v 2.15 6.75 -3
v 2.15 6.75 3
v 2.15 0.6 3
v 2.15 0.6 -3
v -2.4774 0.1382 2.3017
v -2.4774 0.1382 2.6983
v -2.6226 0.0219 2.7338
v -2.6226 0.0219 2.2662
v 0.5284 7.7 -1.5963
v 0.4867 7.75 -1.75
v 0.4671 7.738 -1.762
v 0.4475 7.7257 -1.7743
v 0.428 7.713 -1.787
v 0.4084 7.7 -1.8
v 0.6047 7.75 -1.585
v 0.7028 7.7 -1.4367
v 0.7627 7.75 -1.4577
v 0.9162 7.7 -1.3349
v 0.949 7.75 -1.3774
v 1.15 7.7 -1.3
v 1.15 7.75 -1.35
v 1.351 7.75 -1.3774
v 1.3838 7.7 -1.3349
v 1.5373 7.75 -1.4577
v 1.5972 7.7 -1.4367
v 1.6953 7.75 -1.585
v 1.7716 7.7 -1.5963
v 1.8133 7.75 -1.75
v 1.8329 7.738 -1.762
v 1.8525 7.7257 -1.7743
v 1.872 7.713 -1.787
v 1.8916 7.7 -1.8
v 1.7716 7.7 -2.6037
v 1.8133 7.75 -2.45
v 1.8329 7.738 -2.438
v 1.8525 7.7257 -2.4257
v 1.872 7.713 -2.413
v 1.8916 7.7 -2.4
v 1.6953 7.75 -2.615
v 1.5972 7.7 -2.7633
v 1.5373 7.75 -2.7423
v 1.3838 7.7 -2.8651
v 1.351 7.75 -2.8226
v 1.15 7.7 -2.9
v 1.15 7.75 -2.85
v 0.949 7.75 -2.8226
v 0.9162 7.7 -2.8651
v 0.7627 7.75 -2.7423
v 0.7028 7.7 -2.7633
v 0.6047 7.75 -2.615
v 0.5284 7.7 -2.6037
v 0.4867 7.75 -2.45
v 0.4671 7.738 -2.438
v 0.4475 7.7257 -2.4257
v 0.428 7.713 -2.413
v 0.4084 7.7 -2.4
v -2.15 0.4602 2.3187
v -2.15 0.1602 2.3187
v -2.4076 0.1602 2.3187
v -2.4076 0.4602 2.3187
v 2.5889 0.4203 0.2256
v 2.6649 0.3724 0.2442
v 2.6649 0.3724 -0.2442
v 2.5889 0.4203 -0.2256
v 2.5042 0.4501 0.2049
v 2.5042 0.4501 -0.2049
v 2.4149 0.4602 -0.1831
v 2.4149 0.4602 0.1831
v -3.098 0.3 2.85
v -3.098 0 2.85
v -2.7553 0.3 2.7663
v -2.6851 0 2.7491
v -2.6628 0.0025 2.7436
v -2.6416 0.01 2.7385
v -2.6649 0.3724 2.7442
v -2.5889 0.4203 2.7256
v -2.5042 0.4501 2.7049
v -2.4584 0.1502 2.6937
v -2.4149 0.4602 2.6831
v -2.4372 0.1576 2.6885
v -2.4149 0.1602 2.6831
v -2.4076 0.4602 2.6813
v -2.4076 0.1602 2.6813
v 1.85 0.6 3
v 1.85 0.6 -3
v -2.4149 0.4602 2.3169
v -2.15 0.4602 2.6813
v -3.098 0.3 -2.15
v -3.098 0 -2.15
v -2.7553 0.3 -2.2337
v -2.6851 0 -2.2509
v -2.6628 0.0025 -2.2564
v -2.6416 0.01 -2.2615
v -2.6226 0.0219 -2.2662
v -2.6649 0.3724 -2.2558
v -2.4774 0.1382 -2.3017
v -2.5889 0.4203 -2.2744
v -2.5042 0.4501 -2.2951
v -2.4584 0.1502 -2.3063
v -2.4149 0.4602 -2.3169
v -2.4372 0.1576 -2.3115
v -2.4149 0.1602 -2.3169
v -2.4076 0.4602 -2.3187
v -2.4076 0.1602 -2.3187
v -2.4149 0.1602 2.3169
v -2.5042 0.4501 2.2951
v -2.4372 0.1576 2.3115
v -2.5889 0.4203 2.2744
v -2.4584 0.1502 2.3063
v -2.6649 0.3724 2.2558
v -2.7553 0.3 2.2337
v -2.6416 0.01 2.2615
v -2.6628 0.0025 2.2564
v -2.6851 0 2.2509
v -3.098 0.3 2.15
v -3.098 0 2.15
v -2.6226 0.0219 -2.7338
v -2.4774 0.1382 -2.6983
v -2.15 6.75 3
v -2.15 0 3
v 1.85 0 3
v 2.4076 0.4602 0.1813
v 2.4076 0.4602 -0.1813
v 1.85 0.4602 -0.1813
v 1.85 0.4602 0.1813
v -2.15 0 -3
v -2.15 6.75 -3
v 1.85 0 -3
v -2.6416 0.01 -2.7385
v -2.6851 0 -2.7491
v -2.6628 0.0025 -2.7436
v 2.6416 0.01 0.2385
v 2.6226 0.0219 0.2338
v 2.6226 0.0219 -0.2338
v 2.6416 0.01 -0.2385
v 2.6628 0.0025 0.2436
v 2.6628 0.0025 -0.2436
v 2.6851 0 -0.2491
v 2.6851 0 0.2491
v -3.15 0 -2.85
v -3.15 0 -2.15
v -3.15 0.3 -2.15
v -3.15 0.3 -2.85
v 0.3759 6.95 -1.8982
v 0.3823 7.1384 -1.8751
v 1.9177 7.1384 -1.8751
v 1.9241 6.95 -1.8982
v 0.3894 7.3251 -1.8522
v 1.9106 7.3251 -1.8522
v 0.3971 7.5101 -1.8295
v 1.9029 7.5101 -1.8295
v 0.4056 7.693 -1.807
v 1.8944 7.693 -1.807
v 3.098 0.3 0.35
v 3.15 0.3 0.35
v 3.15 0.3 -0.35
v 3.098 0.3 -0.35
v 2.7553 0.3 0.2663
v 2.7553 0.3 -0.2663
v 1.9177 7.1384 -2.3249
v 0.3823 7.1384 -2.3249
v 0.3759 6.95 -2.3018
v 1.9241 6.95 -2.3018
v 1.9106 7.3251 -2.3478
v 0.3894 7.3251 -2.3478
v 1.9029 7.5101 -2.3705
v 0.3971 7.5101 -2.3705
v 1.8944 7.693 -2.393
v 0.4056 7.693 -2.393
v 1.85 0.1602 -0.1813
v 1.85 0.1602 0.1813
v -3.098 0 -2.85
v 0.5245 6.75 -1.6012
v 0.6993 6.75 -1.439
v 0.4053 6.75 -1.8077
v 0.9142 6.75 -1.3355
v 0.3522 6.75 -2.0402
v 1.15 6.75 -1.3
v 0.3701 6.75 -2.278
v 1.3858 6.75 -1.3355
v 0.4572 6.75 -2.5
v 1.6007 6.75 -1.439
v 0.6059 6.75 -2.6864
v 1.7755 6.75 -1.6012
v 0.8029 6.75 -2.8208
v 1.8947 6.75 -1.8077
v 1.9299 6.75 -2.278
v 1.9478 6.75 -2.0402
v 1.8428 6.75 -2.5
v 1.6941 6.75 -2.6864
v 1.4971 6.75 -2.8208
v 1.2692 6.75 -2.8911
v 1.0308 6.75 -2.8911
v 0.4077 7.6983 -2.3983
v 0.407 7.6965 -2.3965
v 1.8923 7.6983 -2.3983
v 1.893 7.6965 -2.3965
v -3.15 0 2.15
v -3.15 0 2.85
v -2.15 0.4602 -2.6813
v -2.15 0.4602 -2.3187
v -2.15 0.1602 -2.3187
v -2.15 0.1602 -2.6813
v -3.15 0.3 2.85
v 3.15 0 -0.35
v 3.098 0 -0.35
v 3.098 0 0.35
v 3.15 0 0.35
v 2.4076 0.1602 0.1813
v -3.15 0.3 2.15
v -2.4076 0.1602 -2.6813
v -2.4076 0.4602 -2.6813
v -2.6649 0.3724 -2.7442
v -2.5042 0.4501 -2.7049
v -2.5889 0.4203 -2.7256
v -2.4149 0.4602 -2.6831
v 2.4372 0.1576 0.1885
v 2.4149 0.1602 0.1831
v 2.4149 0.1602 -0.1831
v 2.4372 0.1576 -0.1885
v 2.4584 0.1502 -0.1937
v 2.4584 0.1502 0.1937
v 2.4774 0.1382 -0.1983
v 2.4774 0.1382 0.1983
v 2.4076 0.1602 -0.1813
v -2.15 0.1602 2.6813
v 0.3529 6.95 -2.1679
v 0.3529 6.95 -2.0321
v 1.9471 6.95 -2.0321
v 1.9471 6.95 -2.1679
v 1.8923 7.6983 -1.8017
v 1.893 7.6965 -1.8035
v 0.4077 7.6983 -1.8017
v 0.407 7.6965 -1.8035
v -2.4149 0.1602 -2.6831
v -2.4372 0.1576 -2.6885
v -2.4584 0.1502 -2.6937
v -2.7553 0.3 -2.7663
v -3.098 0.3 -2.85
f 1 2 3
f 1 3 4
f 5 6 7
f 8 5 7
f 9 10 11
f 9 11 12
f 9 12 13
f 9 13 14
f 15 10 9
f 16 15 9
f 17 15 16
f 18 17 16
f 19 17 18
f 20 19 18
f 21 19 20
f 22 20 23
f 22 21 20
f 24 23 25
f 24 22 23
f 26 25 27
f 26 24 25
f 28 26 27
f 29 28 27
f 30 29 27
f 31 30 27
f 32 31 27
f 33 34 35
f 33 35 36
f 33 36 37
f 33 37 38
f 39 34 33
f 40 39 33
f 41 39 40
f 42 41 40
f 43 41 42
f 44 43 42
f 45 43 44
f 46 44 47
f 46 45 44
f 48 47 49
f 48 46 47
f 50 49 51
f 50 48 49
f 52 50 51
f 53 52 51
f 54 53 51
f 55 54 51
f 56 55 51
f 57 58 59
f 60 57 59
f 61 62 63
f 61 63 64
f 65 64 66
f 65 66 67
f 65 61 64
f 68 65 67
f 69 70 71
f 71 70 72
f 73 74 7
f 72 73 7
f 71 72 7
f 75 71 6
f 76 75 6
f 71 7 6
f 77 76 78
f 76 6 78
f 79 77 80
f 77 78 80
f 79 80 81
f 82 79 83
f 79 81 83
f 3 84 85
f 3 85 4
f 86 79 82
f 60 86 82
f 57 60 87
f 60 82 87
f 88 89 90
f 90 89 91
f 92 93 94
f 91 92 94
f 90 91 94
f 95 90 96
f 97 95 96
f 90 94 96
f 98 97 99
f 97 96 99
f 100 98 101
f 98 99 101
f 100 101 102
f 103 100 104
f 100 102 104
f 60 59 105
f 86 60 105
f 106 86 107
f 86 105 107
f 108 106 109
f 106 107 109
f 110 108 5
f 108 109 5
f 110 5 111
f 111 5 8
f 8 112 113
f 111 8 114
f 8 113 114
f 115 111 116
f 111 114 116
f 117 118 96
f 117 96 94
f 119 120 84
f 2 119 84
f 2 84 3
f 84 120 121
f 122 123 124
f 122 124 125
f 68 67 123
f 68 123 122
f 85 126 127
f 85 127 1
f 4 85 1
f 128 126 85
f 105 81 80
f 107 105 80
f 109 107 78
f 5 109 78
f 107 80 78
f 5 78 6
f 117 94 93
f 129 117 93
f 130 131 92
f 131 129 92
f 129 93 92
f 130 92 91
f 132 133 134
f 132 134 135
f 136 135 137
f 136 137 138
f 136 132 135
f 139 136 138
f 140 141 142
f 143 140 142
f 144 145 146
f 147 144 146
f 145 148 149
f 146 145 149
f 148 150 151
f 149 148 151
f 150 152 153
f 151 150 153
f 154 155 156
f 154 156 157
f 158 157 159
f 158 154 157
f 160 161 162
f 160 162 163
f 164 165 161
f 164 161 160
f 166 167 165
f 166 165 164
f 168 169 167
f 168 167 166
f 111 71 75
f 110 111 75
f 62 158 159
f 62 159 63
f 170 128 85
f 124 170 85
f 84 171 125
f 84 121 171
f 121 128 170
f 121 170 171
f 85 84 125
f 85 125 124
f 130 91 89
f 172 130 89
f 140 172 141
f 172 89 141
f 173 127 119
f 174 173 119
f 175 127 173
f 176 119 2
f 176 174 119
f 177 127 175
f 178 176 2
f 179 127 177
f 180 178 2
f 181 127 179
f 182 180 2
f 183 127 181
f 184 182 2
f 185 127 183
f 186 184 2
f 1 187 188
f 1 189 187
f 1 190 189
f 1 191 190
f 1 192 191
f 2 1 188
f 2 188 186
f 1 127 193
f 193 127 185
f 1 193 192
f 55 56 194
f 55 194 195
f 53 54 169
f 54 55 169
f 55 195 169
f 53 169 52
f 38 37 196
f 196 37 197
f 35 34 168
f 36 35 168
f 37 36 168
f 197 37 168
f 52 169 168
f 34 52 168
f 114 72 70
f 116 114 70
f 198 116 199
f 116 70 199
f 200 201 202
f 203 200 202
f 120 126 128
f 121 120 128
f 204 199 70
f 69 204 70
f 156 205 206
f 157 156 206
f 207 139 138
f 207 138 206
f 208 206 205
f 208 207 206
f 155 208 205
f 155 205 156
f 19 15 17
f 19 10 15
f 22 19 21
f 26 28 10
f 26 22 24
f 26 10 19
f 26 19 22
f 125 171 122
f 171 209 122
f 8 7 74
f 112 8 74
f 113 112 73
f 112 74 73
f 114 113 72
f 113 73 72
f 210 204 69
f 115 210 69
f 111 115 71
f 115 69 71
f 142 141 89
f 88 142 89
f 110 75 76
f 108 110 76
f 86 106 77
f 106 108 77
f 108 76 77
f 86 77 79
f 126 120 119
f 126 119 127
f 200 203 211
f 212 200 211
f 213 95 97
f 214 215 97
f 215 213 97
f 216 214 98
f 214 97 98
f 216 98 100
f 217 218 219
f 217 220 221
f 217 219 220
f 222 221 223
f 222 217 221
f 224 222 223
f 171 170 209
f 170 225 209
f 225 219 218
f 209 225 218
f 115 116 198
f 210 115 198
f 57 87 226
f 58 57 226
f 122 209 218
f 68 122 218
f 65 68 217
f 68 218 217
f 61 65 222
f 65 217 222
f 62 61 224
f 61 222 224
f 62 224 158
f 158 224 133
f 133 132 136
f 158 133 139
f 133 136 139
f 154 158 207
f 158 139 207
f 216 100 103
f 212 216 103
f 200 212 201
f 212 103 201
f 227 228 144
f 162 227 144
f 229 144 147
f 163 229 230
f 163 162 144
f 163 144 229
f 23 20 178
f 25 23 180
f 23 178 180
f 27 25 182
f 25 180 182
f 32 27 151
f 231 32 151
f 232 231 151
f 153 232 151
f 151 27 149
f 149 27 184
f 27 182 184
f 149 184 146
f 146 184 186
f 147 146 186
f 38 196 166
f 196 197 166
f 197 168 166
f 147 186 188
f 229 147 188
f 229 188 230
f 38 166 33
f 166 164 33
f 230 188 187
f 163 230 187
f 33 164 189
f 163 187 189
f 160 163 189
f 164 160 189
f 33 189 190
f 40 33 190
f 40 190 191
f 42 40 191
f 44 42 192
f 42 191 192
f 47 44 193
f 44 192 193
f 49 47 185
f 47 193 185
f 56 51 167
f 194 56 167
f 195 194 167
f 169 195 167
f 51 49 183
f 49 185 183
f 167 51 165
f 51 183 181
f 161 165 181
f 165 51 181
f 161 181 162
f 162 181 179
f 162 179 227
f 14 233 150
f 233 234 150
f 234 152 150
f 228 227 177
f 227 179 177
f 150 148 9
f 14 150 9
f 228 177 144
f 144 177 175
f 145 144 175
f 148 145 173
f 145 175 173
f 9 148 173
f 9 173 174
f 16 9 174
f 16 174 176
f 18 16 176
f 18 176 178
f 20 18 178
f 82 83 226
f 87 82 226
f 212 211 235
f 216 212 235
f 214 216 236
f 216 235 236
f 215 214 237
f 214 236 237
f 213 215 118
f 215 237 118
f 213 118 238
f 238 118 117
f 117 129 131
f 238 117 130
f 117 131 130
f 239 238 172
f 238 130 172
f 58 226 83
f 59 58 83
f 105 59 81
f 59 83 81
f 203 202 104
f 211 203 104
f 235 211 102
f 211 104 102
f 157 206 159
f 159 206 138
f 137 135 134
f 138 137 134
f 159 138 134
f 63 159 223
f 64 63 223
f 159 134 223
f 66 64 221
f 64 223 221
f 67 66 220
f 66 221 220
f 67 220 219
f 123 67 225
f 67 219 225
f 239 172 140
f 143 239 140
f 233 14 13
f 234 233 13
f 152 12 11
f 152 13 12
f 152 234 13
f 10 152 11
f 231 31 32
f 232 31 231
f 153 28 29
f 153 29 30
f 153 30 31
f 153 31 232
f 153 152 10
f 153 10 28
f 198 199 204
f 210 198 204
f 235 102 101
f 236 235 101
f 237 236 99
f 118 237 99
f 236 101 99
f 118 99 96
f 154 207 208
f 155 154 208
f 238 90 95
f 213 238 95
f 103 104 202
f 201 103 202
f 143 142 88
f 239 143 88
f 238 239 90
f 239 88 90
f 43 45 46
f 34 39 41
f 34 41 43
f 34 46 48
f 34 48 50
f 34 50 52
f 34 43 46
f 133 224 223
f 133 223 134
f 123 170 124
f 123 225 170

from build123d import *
from OCP.BRepFilletAPI import BRepFilletAPI_MakeChamfer

# Parameters (mm, degrees)
SKETCH1_W           = 4.3
SKETCH1_H           = 6
BOSS_EXTRUDE1_DEPTH = 6.75
SKETCH2_R           = 0.8
BOSS_EXTRUDE2_DEPTH = 1
SKETCH3_W           = 1.811917262
SKETCH3_H           = 0.6
CUT_EXTRUDE2_DEPTH  = 0.8
CUT_EXTRUDE2_DRAFT  = -7
CHAMFER1_SIZE       = 0.05
CHAMFER1_SIZE2      = 0.05742659
BOSS_EXTRUDE3_DEPTH = 6
CUT_EXTRUDE5_DEPTH  = 0.8
SKETCH9_W           = 0.3
SKETCH9_H           = 0.6
CUT_EXTRUDE7_DEPTH  = 11.294901651
SKETCH10_W          = 0.362580834
SKETCH10_H          = 0.3
BOSS_EXTRUDE4_DEPTH = 0.3


with BuildPart() as part:
    # Sketch1 → Boss-Extrude1 (new body)
    with BuildSketch(Plane(origin=(0, 0, 0), x_dir=(1, 0, 0), z_dir=(0, 1, 0))):
        Rectangle(SKETCH1_W, SKETCH1_H)
    extrude(amount=BOSS_EXTRUDE1_DEPTH)

    # Sketch2 → Boss-Extrude2 (add)
    with BuildSketch(Plane(origin=(0, 6.75, 0), x_dir=(1, 0, 0), z_dir=(0, 1, 0))):
        with Locations(Location((1.15, 2.1, 0), (0, 0, 270))):
            Circle(SKETCH2_R)
    extrude(amount=BOSS_EXTRUDE2_DEPTH)


with BuildPart() as cut_extrude2_tool:
    # Sketch3 → Cut-Extrude2 (with draft: the straight prism first)
    with BuildSketch(Plane(origin=(0, 7.75, 0), x_dir=(1, 0, 0), z_dir=(0, 1, 0))):
        with Locations((1.15, 2.1)):
            Rectangle(SKETCH3_W, SKETCH3_H)
    extrude(amount=-CUT_EXTRUDE2_DEPTH)
    # Cut-Extrude2: the draft: its side faces are tilted about the plane it starts from
    cut_extrude2_sides = [cut_extrude2_tool.faces().sort_by_distance(p)[0] for p in [
        (1.15, 7.35, -2.4),
        (0.244041369, 7.35, -2.1),
        (1.15, 7.35, -1.8),
        (2.055958631, 7.35, -2.1),
    ]]
    draft(cut_extrude2_sides, Plane(origin=(0, 7.75, 0), x_dir=(1, 0, 0), z_dir=(0, 1, 0)), CUT_EXTRUDE2_DRAFT)


with BuildPart() as part_1:
    add(part.part)

    # Cut-Extrude2: cut by cut_extrude2_tool
    add(cut_extrude2_tool.part, mode=Mode.SUBTRACT)

    # Chamfer1: one chamfer whose edges measure the first distance from different faces: ONE call of the kernel's chamfer builder (chamfer() names one face for all edges)
    chamfer1_edges_1 = [part_1.edges().sort_by_distance(p)[0] for p in [
        (1.15, 7.75, -2.4),
    ]]
    chamfer1_side_1 = [part_1.faces().sort_by_distance(p)[0] for p in [
        (1.15, 7.75, -2.606561726),
    ]]
    chamfer1_edges_2 = [part_1.edges().sort_by_distance(p)[0] for p in [
        (1.15, 7.75, -1.8),
    ]]
    chamfer1_side_2 = [part_1.faces().sort_by_distance(p)[0] for p in [
        (1.15, 7.75, -1.593438274),
    ]]
    chamfer1_edges_3 = [part_1.edges().sort_by_distance(p)[0] for p in [
        (1.597213595, 7.75, -1.436675042),
        (1.15, 7.75, -2.9),
    ]]
    chamfer1 = BRepFilletAPI_MakeChamfer(part_1.part.solid().wrapped)
    for e in chamfer1_edges_1:
        chamfer1.Add(CHAMFER1_SIZE, CHAMFER1_SIZE2, e.wrapped, chamfer1_side_1[0].wrapped)  # the first distance lies on this face
    for e in chamfer1_edges_2:
        chamfer1.Add(CHAMFER1_SIZE, CHAMFER1_SIZE2, e.wrapped, chamfer1_side_2[0].wrapped)  # the first distance lies on this face
    for e in chamfer1_edges_3:
        chamfer1.Add(CHAMFER1_SIZE, e.wrapped)
    add(Compound.cast(chamfer1.Shape()), mode=Mode.REPLACE)


with BuildPart() as body_2:
    # Sketch6 → Boss-Extrude3 (new, through all)
    with BuildSketch(Plane.XY.offset(3)):
        with BuildLine():
            Line((-2.15, 0.160165276), (-2.414893608, 0.160165276))
            ThreePointArc((-2.414893608, 0.160165276), (-2.448018066, 0.154519768), (-2.477402436, 0.138220682))
            Line((-2.477402436, 0.138220682), (-2.622597564, 0.021944594))
            ThreePointArc((-2.622597564, 0.021944594), (-2.651981934, 0.005645507), (-2.685106392, 0))
            Line((-2.685106392, 0), (-3.15, 0))
            Line((-3.15, 0), (-3.15, 0.3))
            Line((-3.15, 0.3), (-2.755319175, 0.3))
            Line((-2.755319175, 0.3), (-2.664928921, 0.3723869))
            ThreePointArc((-2.664928921, 0.3723869), (-2.547391439, 0.437583247), (-2.414893608, 0.460165276))
            Line((-2.414893608, 0.460165276), (-2.15, 0.460165276))
            Line((-2.15, 0.460165276), (-2.15, 0.160165276))
        make_face()
    boss_extrude3 = extrude(amount=-BOSS_EXTRUDE3_DEPTH)


with BuildPart() as part_2:
    add(part_1.part)

    # Mirror8: Boss-Extrude3 across plane
    add(boss_extrude3.mirror(Plane(origin=(0, 0, 0), x_dir=(0, 0, 1), z_dir=(1, 0, 0))))


with BuildPart() as cut_extrude5_tool:
    # Sketch7 → Cut-Extrude5 (new body)
    with BuildSketch(Plane.XZ):
        Polygon((-2.15, -2.318709583), (-2.15, 2.318709583), (-2.407647713, 2.318709583), (-3.09799799, 2.15), (-3.15, 2.15), (-3.15, -2.15), (-3.09799799, -2.15), (-2.407647713, -2.318709583), align=None)
        Polygon((-3.15, 2.85), (-3.09799799, 2.85), (-2.407647713, 2.681290417), (-2.15, 2.681290417), (-2.15, 3), (-3.15, 3), align=None)
        Polygon((-2.15, -3), (-2.15, -2.681290417), (-2.407647713, -2.681290417), (-3.09799799, -2.85), (-3.15, -2.85), (-3.15, -3), align=None)
        Polygon((2.407647713, -0.181290417), (2.15, -0.181290417), (2.15, -3), (3.15, -3), (3.15, -0.35), (3.09799799, -0.35), align=None)
        Polygon((2.15, 3), (2.15, 0.181290417), (2.407647713, 0.181290417), (3.09799799, 0.35), (3.15, 0.35), (3.15, 3), align=None)
    extrude(amount=-CUT_EXTRUDE5_DEPTH)


with BuildPart() as part_3:
    add(part_2.part)

    # Cut-Extrude5: cut by cut_extrude5_tool
    add(cut_extrude5_tool.part, mode=Mode.SUBTRACT)

    # Sketch9 → Cut-Extrude7 (cut, through all)
    with BuildSketch(Plane.XY.offset(3)):
        with Locations((2, 0.3)):
            Rectangle(SKETCH9_W, SKETCH9_H)
    extrude(amount=-CUT_EXTRUDE7_DEPTH, mode=Mode.SUBTRACT)


with BuildPart() as body_2_1:
    add(body_2.part)

    # Cut-Extrude5: cut by cut_extrude5_tool
    add(cut_extrude5_tool.part, mode=Mode.SUBTRACT)


with BuildPart() as cut_extrude7_piece_1:
    # of the separate pieces the step leaves, piece 1, a body of its own (cut_extrude7_pieces)
    add(part_3.part.solids().sort_by_distance((1.15, 7.7, -1.3))[0])



with BuildPart() as cut_extrude7_piece_2:
    # of the separate pieces the step leaves, piece 2, a body of its own (cut_extrude7_pieces)
    add(part_3.part.solids().sort_by_distance((2.414893608, 0.460165276, 0.183061188))[0])


with BuildPart() as cut_extrude7_piece_1_1:
    add(cut_extrude7_piece_1.part)

    add(cut_extrude7_piece_2.part)  # Boss-Extrude4 merges Cut-Extrude7 piece 2
    # Sketch10 → Boss-Extrude4 (add)
    with BuildSketch(Plane.ZY.offset(-2.15)):
        with Locations((0, 0.310165276)):
            Rectangle(SKETCH10_W, SKETCH10_H)
    extrude(amount=BOSS_EXTRUDE4_DEPTH)


solid = Compound([body_2_1.part, cut_extrude7_piece_1_1.part])
